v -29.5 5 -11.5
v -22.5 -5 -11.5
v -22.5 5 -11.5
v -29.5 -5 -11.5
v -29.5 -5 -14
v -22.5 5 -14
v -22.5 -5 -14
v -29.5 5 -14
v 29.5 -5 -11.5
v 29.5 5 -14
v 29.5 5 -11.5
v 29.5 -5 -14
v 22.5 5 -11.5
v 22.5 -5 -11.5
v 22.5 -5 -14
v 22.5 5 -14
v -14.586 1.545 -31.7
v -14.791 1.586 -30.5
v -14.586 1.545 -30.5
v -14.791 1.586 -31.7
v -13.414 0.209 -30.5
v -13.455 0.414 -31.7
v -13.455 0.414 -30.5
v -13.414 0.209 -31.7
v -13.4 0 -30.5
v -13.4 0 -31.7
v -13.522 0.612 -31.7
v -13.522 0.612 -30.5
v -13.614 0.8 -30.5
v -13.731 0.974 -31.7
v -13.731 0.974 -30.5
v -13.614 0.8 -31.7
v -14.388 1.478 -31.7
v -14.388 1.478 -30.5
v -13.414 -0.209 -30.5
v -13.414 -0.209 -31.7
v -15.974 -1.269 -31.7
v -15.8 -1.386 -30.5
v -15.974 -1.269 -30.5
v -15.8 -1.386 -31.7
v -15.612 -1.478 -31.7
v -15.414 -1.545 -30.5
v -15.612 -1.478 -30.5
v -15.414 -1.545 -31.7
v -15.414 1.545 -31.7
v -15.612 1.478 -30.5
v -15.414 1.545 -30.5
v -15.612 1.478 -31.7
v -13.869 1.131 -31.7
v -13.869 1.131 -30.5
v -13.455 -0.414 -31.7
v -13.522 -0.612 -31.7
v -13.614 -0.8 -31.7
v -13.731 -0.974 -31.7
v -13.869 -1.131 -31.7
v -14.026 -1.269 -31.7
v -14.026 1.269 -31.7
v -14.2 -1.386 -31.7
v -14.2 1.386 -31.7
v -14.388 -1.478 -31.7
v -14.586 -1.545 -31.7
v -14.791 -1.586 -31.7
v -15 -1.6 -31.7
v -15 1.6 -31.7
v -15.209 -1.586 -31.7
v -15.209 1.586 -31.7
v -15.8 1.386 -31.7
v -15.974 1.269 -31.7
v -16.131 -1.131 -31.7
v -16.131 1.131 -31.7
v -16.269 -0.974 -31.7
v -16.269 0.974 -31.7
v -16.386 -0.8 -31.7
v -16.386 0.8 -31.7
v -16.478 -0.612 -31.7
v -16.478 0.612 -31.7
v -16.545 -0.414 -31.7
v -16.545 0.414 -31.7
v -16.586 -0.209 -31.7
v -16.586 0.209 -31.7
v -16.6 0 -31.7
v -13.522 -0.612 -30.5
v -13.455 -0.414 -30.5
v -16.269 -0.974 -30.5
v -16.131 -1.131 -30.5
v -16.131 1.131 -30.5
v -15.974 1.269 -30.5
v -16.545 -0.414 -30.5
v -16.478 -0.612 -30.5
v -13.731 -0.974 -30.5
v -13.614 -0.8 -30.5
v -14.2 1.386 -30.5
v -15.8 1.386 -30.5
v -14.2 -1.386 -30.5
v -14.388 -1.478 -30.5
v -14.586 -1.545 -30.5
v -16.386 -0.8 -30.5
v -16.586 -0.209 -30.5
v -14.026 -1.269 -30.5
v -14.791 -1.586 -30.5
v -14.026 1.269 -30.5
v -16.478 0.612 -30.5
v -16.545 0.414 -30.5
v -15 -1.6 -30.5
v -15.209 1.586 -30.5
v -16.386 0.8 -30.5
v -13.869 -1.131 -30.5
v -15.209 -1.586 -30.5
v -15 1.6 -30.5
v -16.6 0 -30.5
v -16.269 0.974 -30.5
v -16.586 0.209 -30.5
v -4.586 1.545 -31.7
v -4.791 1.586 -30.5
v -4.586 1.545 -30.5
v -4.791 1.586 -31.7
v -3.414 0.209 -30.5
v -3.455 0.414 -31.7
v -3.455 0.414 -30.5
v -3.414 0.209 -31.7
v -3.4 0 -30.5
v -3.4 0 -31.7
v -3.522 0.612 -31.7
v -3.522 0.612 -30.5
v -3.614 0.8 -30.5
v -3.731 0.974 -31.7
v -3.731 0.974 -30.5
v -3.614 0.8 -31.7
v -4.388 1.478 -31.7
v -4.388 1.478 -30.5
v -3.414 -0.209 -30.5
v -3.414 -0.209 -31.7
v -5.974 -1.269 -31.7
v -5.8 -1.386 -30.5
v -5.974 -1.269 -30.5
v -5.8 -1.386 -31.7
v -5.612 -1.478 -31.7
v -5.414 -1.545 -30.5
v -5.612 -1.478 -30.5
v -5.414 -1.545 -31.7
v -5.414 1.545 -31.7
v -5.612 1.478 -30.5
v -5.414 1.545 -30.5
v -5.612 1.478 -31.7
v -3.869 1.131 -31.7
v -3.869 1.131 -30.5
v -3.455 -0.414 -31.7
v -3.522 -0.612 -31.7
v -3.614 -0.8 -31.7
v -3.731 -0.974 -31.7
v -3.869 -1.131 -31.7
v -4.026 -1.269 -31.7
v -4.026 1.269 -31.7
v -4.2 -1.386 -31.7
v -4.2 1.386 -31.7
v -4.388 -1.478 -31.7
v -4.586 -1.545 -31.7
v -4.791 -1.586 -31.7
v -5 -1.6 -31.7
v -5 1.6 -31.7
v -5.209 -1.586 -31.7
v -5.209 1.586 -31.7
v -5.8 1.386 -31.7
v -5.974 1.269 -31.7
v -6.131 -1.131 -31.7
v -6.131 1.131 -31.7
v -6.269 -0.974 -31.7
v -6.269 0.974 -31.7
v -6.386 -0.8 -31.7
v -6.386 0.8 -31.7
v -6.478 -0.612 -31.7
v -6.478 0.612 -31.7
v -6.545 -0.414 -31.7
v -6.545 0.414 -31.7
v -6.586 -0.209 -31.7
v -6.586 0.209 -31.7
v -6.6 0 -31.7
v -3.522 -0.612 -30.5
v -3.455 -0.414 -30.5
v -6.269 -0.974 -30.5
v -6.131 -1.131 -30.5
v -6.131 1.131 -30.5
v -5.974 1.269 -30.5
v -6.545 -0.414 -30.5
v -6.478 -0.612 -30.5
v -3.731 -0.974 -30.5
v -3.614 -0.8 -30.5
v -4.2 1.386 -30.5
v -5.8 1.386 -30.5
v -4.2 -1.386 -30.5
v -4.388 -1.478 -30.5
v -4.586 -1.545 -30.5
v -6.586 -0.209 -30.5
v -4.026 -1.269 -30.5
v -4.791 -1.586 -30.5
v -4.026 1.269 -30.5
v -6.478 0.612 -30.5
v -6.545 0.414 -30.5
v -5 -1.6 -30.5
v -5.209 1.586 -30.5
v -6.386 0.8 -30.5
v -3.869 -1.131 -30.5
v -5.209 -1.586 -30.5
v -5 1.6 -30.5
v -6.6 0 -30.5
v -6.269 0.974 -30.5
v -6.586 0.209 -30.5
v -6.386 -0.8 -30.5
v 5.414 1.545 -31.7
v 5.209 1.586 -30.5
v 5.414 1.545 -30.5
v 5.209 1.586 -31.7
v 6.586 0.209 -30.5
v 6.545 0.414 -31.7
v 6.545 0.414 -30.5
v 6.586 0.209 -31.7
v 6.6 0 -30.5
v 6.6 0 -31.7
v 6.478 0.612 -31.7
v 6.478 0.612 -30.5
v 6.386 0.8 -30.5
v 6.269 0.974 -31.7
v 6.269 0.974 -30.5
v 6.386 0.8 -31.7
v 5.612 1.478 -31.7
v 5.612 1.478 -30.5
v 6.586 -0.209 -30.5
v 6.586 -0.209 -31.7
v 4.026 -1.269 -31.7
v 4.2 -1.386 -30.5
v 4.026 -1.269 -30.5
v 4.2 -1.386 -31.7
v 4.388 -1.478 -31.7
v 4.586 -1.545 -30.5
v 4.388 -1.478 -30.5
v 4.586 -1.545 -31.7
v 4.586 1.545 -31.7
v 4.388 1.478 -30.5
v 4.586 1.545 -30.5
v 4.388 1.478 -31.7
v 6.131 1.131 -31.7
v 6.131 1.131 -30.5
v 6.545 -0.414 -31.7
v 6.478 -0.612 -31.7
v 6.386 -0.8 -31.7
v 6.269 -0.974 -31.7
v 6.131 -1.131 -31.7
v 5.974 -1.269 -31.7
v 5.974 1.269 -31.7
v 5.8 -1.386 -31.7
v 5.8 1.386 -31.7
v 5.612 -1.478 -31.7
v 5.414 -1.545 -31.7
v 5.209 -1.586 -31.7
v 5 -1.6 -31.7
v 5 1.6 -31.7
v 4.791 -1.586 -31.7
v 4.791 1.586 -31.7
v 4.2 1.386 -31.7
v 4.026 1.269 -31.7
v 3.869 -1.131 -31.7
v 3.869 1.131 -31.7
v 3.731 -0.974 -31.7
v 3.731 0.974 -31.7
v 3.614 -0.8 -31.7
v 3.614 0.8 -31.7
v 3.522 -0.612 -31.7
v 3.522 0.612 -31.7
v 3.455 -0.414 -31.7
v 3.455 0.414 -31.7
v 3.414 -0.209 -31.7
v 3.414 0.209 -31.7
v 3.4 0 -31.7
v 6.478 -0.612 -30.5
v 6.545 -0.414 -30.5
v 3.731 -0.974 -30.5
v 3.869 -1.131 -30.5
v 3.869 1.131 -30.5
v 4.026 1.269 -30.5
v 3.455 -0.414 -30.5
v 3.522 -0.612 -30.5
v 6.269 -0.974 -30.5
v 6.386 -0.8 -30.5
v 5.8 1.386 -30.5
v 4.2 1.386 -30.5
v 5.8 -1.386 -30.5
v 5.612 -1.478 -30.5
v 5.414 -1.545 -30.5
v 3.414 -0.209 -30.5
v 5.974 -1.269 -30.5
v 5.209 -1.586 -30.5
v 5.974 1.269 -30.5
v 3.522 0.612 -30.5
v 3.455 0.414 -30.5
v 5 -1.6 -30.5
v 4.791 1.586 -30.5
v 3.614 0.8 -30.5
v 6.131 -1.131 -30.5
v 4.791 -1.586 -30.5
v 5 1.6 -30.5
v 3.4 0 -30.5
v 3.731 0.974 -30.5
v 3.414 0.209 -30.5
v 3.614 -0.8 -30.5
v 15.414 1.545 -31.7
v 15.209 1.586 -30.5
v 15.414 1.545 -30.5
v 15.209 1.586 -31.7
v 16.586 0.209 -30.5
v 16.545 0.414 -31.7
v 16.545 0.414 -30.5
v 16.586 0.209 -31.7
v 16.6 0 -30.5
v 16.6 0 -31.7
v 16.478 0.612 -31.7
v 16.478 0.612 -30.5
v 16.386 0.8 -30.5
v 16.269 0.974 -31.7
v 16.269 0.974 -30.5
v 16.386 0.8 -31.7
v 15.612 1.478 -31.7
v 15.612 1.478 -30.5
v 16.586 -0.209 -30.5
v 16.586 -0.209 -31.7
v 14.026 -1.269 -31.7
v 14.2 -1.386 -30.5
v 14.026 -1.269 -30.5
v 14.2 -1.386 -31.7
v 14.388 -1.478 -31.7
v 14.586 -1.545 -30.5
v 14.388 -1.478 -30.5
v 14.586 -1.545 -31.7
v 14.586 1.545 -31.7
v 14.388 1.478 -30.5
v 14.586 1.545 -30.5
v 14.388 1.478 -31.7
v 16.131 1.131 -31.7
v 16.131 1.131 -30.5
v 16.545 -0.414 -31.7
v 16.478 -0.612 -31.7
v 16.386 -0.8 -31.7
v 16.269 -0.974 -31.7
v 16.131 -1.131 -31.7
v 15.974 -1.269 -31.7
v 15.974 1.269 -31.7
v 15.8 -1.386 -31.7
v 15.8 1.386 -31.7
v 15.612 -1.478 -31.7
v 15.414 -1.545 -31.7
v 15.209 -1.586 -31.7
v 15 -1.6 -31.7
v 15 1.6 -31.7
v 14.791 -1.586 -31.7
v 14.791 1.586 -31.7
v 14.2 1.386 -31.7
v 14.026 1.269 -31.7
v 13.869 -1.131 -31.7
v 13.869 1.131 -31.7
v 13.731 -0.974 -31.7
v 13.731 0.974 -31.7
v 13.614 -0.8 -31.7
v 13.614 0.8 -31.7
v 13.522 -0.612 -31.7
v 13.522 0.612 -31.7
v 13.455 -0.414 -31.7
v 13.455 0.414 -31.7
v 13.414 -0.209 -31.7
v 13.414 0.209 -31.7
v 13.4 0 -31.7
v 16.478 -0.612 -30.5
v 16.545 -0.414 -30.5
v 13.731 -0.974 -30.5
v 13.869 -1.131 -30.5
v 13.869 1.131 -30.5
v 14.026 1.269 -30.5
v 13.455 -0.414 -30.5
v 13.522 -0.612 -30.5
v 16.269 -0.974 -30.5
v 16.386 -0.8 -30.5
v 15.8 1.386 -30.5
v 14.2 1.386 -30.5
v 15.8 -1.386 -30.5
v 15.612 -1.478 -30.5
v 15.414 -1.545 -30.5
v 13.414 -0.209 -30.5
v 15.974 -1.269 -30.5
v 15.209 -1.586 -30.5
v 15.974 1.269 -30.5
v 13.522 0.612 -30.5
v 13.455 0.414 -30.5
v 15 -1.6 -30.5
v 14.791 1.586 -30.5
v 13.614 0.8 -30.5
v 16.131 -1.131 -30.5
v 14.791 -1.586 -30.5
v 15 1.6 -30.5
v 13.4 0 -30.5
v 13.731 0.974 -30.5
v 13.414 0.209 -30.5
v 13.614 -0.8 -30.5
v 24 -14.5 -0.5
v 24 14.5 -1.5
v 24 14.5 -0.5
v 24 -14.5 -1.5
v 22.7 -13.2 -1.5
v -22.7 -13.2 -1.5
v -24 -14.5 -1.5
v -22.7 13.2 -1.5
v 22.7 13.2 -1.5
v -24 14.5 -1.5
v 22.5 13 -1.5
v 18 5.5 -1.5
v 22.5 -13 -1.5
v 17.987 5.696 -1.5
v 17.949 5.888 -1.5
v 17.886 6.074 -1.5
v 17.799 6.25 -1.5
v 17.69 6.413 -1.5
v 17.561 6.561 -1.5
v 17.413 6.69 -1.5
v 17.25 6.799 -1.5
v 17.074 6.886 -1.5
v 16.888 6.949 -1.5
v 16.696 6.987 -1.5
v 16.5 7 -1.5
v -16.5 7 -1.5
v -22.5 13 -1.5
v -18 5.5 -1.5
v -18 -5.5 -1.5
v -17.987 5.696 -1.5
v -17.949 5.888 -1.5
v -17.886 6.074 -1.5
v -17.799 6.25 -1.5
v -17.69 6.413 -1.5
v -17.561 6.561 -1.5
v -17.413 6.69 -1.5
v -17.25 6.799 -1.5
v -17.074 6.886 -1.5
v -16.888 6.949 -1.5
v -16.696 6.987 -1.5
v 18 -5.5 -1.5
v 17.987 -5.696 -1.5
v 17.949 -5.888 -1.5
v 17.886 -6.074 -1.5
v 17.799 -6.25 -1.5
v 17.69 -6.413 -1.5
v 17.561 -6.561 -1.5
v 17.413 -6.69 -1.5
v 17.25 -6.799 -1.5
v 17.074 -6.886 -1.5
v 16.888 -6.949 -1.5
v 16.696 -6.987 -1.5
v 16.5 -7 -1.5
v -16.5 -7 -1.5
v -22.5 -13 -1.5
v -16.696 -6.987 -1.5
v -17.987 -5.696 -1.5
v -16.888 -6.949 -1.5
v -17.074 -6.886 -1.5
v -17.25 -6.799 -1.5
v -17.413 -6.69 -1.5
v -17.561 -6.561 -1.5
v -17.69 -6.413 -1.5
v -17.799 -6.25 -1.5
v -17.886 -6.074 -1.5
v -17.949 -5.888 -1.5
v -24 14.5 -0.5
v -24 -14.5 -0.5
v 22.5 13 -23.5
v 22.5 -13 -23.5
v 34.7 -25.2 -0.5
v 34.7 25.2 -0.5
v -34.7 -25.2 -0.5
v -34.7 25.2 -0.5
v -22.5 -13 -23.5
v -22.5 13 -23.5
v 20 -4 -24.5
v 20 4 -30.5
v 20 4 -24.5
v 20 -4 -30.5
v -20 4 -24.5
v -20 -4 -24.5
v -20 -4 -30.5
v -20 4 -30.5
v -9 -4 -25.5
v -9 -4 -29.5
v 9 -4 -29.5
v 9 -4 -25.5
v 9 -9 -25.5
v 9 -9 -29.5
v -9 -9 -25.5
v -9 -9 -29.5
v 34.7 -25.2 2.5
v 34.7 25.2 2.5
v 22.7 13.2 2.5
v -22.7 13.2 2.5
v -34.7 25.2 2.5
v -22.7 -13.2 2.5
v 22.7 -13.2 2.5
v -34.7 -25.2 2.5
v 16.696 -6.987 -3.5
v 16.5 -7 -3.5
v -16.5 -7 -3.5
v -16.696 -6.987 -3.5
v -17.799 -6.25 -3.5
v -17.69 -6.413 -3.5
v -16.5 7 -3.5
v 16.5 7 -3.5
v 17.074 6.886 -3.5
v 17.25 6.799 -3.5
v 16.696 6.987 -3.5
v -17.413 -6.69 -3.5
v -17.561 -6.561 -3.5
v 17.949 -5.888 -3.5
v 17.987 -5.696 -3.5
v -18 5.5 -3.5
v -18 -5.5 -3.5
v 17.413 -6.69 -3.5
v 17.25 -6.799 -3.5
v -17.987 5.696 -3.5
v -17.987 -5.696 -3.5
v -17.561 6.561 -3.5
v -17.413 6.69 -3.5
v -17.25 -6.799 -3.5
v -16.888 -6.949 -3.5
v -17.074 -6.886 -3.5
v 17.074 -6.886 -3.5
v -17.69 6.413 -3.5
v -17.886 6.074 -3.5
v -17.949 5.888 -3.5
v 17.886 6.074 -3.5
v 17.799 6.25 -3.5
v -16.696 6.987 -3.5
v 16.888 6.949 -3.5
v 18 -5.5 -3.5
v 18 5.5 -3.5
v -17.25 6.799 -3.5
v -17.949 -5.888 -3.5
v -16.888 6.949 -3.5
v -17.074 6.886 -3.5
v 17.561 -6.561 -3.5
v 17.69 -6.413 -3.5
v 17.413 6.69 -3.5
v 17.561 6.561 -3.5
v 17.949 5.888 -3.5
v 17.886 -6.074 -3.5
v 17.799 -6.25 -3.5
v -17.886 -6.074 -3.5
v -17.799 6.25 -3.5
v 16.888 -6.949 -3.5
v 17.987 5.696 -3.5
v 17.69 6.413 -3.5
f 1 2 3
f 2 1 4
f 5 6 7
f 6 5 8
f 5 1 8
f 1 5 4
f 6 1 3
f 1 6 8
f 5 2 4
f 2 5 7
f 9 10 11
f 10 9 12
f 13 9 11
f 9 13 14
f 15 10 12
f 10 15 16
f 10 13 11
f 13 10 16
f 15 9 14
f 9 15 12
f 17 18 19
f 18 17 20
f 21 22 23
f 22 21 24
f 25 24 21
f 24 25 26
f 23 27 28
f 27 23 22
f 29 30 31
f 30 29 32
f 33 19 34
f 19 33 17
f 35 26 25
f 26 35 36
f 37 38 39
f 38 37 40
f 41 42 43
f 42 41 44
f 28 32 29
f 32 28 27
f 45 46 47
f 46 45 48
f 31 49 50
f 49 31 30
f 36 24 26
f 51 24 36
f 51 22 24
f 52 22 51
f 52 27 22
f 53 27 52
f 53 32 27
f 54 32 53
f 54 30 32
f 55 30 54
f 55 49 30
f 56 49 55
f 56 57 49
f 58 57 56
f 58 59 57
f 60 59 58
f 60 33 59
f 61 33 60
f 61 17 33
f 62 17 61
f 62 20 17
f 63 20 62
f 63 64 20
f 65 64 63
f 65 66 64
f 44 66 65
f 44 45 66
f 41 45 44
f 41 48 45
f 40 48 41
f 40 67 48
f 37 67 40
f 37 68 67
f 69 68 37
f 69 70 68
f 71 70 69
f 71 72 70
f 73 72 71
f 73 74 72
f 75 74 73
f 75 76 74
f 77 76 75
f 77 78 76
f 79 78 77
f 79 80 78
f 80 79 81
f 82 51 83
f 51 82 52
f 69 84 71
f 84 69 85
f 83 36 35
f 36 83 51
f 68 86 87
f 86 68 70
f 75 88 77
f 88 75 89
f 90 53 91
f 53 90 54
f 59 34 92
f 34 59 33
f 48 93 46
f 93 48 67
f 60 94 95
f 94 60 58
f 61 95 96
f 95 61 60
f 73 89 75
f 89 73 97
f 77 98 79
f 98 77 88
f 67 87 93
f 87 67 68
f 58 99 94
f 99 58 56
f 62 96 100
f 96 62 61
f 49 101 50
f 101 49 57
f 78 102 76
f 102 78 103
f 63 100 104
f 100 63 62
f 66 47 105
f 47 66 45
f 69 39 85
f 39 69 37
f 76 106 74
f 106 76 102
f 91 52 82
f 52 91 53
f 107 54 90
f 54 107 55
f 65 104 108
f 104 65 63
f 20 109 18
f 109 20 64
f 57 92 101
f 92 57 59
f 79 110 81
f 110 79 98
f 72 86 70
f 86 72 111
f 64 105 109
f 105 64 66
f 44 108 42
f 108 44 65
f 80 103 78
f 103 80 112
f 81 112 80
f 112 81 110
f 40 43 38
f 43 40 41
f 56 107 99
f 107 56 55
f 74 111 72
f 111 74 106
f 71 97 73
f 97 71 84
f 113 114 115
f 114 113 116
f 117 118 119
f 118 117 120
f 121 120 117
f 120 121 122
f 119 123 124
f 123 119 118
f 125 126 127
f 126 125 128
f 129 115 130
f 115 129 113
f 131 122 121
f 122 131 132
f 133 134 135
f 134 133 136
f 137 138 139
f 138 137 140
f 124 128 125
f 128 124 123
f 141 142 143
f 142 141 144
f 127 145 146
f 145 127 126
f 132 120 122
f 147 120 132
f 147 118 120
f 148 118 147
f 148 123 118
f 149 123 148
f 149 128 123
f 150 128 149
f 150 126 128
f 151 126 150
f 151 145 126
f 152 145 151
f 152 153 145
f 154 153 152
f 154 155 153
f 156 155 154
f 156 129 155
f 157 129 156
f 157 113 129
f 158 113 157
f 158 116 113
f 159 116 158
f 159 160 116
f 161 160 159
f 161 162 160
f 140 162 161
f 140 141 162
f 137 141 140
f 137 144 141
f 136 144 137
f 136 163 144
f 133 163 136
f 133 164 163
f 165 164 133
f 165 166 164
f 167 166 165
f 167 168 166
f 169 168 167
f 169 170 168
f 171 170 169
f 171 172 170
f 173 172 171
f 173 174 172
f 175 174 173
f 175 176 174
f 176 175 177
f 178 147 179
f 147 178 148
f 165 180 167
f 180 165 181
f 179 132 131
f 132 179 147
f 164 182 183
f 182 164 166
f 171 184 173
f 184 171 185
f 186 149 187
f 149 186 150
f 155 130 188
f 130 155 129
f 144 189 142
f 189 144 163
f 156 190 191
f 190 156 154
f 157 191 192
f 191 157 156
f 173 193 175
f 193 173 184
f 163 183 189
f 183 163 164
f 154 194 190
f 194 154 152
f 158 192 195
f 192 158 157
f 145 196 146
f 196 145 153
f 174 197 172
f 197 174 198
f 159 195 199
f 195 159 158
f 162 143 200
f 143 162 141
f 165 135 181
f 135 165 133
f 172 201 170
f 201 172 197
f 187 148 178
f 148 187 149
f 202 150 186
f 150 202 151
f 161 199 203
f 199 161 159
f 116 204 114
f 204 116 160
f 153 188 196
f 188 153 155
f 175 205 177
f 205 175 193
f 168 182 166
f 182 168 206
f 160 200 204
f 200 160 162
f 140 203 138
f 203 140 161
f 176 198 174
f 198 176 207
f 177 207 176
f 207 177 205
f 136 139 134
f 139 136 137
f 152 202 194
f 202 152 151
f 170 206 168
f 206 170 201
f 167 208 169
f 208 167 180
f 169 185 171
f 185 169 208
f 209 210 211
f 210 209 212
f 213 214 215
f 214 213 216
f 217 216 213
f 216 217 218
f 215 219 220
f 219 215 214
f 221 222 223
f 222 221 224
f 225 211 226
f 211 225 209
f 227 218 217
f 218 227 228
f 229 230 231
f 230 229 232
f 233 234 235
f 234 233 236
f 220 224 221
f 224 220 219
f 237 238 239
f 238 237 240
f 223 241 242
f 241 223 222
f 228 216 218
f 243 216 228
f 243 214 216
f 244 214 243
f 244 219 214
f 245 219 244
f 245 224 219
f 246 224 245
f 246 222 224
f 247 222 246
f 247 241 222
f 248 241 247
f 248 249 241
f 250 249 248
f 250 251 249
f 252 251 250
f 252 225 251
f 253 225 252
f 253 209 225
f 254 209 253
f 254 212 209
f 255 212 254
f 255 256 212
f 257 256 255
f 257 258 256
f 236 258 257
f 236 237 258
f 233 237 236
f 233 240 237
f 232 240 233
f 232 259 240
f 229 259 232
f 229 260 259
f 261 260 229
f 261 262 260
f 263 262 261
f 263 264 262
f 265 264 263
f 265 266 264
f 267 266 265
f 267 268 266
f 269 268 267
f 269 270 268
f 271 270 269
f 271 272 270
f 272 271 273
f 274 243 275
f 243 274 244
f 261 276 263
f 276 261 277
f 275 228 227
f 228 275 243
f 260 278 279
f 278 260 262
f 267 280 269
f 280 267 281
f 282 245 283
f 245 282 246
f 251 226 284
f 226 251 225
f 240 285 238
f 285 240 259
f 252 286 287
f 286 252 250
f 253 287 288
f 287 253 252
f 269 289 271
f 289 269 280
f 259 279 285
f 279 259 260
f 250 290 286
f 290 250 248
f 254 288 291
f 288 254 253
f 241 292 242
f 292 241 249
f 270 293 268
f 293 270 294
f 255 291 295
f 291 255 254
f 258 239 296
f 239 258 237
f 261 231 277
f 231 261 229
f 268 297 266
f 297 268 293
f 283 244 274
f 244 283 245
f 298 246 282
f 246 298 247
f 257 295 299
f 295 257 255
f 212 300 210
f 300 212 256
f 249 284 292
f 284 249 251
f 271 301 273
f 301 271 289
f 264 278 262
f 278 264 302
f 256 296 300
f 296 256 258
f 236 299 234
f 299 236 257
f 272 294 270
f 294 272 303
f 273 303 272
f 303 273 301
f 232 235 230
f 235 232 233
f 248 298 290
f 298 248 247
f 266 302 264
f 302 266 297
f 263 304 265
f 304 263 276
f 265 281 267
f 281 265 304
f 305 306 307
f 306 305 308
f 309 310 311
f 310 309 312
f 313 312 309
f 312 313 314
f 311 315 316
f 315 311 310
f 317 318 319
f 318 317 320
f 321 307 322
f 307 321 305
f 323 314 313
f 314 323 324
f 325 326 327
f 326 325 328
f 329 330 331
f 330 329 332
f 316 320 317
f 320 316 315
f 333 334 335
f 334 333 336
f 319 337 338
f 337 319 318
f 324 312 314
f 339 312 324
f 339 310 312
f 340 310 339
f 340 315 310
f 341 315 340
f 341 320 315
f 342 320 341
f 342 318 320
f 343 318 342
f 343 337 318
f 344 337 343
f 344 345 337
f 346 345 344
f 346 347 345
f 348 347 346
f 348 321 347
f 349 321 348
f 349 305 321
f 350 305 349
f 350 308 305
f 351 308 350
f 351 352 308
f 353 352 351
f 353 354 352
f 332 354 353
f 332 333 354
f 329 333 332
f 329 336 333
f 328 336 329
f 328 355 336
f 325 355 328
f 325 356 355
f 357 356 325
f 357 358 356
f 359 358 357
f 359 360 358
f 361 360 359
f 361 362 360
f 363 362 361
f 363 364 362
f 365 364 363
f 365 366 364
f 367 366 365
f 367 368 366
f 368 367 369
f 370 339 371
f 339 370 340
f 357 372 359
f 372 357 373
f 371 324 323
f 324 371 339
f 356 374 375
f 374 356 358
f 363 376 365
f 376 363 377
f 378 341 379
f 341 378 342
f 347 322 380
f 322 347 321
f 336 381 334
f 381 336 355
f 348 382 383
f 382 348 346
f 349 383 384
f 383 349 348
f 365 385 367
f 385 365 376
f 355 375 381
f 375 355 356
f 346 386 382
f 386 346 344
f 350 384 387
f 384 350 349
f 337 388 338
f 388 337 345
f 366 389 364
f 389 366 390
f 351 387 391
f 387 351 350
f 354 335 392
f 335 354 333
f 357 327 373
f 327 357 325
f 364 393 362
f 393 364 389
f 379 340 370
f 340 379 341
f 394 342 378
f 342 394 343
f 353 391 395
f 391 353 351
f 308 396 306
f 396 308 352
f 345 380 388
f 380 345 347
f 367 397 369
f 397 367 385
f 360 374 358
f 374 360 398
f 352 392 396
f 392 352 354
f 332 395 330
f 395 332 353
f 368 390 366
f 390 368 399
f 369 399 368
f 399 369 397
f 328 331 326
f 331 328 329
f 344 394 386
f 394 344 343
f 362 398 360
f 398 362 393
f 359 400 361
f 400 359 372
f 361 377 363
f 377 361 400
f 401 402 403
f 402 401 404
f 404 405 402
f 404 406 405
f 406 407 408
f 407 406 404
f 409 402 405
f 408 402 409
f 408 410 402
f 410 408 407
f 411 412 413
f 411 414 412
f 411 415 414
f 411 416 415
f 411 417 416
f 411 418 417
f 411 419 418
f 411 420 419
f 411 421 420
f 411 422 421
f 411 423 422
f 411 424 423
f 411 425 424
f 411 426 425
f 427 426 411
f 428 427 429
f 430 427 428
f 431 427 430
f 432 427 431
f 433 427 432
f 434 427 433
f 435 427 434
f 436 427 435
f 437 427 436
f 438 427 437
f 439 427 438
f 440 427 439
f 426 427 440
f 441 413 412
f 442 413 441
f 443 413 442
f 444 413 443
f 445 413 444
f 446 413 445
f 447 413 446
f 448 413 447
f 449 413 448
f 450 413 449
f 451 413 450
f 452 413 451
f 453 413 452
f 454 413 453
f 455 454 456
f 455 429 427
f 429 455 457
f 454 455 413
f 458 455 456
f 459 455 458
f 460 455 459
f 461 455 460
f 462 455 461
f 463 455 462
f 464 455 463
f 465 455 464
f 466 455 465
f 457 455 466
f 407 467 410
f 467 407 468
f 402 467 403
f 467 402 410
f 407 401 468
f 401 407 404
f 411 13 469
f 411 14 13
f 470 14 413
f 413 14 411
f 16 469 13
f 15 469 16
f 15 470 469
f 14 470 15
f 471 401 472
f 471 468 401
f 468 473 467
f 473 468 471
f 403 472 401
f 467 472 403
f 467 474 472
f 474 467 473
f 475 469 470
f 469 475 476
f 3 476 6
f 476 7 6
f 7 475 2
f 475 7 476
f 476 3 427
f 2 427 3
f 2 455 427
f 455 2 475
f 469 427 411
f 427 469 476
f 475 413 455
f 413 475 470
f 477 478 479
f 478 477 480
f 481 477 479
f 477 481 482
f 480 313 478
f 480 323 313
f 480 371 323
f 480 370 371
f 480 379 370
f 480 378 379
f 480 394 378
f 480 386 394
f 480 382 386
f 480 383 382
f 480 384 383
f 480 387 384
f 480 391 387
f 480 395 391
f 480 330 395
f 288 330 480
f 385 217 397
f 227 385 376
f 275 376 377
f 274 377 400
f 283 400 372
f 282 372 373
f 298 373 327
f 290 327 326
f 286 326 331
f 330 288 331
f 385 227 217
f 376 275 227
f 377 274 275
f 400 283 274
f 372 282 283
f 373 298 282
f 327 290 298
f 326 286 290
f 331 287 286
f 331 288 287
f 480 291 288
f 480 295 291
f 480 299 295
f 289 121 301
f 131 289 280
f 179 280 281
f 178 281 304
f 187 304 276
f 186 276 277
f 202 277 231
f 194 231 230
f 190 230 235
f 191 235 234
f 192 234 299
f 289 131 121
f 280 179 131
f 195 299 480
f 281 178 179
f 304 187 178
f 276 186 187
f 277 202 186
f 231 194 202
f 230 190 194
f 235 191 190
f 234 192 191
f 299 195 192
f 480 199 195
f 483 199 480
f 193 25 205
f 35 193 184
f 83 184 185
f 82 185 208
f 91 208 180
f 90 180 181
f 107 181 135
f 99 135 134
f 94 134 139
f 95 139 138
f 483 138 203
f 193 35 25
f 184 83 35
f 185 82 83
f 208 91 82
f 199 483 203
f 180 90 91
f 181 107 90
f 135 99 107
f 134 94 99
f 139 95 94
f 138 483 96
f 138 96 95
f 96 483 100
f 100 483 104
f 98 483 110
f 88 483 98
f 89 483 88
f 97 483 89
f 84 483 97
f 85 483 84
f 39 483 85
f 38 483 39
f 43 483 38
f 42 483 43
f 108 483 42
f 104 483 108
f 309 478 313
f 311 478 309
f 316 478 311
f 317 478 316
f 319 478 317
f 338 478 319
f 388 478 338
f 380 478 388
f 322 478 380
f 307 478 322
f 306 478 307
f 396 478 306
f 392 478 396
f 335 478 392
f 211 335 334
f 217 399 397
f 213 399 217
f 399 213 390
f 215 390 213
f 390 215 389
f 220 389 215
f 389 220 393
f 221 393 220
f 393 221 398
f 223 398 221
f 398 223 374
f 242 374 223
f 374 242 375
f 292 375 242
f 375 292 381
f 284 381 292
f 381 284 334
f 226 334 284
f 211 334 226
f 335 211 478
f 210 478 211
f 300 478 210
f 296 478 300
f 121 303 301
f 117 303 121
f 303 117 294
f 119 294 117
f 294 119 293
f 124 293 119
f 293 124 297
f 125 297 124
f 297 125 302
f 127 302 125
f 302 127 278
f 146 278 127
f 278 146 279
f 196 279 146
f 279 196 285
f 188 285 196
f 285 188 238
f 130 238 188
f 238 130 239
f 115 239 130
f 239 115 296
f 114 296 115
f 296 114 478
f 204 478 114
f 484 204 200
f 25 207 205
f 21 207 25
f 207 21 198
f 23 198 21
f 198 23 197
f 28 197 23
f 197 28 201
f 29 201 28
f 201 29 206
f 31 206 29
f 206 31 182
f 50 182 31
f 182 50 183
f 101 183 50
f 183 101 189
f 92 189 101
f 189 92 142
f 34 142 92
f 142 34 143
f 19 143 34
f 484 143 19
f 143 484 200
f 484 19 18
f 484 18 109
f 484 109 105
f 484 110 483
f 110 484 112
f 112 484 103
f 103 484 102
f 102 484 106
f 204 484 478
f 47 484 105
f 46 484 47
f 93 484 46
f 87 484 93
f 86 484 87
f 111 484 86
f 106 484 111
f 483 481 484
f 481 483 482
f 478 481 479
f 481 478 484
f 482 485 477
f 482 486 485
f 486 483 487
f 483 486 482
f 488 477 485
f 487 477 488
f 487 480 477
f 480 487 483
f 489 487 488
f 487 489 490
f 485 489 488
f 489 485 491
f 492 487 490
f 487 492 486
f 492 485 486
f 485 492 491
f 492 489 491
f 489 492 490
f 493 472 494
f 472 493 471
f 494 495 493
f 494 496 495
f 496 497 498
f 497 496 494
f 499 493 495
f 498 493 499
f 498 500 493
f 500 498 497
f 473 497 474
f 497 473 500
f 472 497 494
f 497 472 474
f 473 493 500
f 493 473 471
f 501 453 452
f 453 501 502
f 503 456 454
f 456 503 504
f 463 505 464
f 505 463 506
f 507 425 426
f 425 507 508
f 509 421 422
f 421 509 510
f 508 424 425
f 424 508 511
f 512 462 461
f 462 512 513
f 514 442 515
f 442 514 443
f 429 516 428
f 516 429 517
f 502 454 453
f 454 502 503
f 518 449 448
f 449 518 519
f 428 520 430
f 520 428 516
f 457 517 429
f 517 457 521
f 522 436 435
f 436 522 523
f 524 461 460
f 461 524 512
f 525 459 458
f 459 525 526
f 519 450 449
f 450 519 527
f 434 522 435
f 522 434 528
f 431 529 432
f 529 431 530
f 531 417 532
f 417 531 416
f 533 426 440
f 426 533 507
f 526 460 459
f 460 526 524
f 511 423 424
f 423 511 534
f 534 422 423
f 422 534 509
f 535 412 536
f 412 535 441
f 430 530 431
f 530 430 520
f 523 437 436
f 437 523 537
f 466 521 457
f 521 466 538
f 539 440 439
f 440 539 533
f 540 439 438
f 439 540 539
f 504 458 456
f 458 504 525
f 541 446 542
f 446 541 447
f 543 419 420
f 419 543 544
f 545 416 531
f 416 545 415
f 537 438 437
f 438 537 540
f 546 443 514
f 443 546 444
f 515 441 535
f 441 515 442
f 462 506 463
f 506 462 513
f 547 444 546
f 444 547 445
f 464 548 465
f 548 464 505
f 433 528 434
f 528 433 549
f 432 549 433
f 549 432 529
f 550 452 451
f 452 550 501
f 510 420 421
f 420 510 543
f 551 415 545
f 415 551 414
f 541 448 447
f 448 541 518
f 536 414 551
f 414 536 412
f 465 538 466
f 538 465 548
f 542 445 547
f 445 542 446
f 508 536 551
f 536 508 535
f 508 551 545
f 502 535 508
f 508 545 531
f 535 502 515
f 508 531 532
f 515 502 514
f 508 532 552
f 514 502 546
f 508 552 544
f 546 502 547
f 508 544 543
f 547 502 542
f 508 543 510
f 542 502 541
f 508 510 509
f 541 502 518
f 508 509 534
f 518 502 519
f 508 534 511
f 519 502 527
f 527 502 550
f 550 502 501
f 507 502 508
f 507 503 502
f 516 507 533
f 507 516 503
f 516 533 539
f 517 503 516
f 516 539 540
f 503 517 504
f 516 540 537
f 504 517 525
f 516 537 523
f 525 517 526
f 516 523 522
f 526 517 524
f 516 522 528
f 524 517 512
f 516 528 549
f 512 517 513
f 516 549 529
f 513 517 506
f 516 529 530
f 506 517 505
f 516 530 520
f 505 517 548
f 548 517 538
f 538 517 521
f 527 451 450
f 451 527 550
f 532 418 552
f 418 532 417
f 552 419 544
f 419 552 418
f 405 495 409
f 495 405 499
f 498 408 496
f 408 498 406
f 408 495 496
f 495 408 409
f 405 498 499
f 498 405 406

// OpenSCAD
// DSN-DC 100V 10A Panel Meter (approximate) - single connected solid
// No text/labels. All parts connected via calculated offsets/overlaps.

$fn = 48;

// Parameters
voltage_range_max_v = 100; //[50:200:1]
current_range_max_a = 10;  //[5:20:1]

cutout_tolerance_mm = 0.2; //[0.0:1.0:0.05]
overlap_mm = 1;            //[0.5:2:0.1]

// Overall envelope (approx DSN-DC style)
overall_x = 48; //[24:96:1]
overall_y = 29; //[15:58:1]
overall_z = 26; //[13:52:1]

// Front bezel
bezel_x = 48; //[24:96:1]
bezel_y = 29; //[15:58:1]
bezel_z = 3;  //[1.5:6:0.5]

// Rear body (insert)
body_x = 45; //[22.5:90:1]
body_y = 26; //[13:52:1]
body_z = 23; //[11.5:46:1]

// Display window
display_ap_x = 36; //[18:72:1]
display_ap_y = 14; //[7:28:1]
display_ap_corner_r = 1.5; //[0:4:0.25]
display_ap_through_z = 6;  //[3:12:0.5]

// Front "lens" recess and inner bezel lip (adds recognizable front-face detail)
lens_recess_depth = 1.2; //[0.5:2.5:0.1]
lens_lip = 1.2;          //[0.5:3:0.1]

// Button
button_enabled = 1; //[0:1:1]
button_radius = 2.2; //[1:4.5:0.1]
button_height = 1.2; //[0.6:2.4:0.1]
button_x_offset = 18; //[0:30:1]
button_y_offset = -9; //[-20:20:1]

// Mounting side tabs (ears)
tab_enabled = 1; //[0:1:1]
tab_x = 8;  //[4:16:0.5]
tab_y = 10; //[5:20:0.5]
tab_z = 2.5; //[1:5:0.25]
tab_z_offset = 10; //[5:20:1]

// Rear terminal block + pads (adds recognizable back-side connectivity)
term_block_x = 40; //[20:60:1]
term_block_y = 8;  //[5:16:0.5]
term_block_z = 6;  //[3:12:0.5]
term_block_setback = 2; //[0:6:0.5]  // from rear face of body

pad_count = 4;          // typical DSN-DC has multiple connections
pad_pitch = 10;         //[6:14:0.5]
pad_d = 3.2;            //[2:5:0.1]
pad_h = 2.2;            //[1:4:0.1]
pad_y_offset = 0;       // centered on terminal block

// Shunt-like rear protrusion (stylized)
shunt_x = 18; //[10:30:1]
shunt_y = 6;  //[3:12:0.5]
shunt_z = 4;  //[2:10:0.5]
shunt_offset_y = -(term_block_y/2 + shunt_y/2 - overlap_mm);

// Panel cutout (kept but fused to model so output is one connected solid)
panel_thickness = 3; //[1:6:0.5]
panel_margin = 12;   //[6:24:1]
rear_clearance_extra = 6; //[3:12:0.5]

// Helpers
module rounded_rect_prism(x, y, z, r, center=true) {
  r2 = min(r, min(x,y)/2);
  translate(center ? [0,0,0] : [x/2,y/2,z/2])
    linear_extrude(height=z, center=true)
      offset(r=r2)
        square([x-2*r2, y-2*r2], center=true);
}

module rounded_window_cut(x, y, z, r) {
  // A rounded-rectangle "cutter" centered at origin
  linear_extrude(height=z, center=true)
    offset(r=r)
      square([x-2*r, y-2*r], center=true);
}

module panel_meter_solid() {
  // Coordinate convention:
  // Front face of bezel at z = +bezel_z/2
  // Bezel centered at z=0, body extends to negative z.
  union() {
    // --- Main housing (bezel + body) as one connected solid ---
    // Bezel block
    translate([0,0,0])
      cube([bezel_x, bezel_y, bezel_z], center=true);

    // Rear body connected to bezel with overlap
    translate([0,0, -(bezel_z/2 + body_z/2 - overlap_mm)])
      cube([body_x, body_y, body_z], center=true);

    // Side mounting tabs (ears) connected to body
    if (tab_enabled) {
      tab_z_center = -(bezel_z/2 + tab_z_offset + tab_z/2);
      translate([-(body_x/2 + tab_x/2 - overlap_mm), 0, tab_z_center])
        cube([tab_x, tab_y, tab_z], center=true);
      translate([(body_x/2 + tab_x/2 - overlap_mm), 0, tab_z_center])
        cube([tab_x, tab_y, tab_z], center=true);
    }

    // --- Rear terminal block connected to rear of body ---
    // Rear face of body is at z = -(bezel_z/2 + body_z - overlap_mm)
    body_center_z = -(bezel_z/2 + body_z/2 - overlap_mm);
    body_rear_face_z = body_center_z - body_z/2;

    term_center_z = body_rear_face_z - term_block_z/2 + overlap_mm - term_block_setback;
    translate([0, 0, term_center_z])
      cube([term_block_x, term_block_y, term_block_z], center=true);

    // Rear pads/posts on terminal block (protrude further back)
    // Terminal block rear face:
    term_rear_face_z = term_center_z - term_block_z/2;
    pad_center_z = term_rear_face_z - pad_h/2 + overlap_mm;

    for (i = [0:pad_count-1]) {
      x_i = (i - (pad_count-1)/2) * pad_pitch;
      translate([x_i, pad_y_offset, pad_center_z])
        cylinder(d=pad_d, h=pad_h, center=true);
    }

    // Shunt-like protrusion connected under terminal block
    shunt_center_z = term_center_z; // same z as terminal block for solid connection
    translate([0, shunt_offset_y, shunt_center_z])
      cube([shunt_x, shunt_y, shunt_z], center=true);

    // Front button connected to bezel front
    if (button_enabled) {
      // Bezel front face at +bezel_z/2
      btn_center_z = (bezel_z/2) + button_height/2 - overlap_mm;
      translate([button_x_offset, button_y_offset, btn_center_z])
        cylinder(r=button_radius, h=button_height, center=true);
    }

    // Panel "sheet" fused to bezel (so output remains one connected solid)
    // Place panel behind bezel front, intersecting bezel slightly.
    panel_center_z = (bezel_z/2) - panel_thickness/2 + overlap_mm;
    translate([0,0,panel_center_z])
      cube([body_x + 2*(panel_margin + cutout_tolerance_mm),
            body_y + 2*(panel_margin + cutout_tolerance_mm),
            panel_thickness], center=true);
  }
}

module panel_meter() {
  // Carve front-face details (display window + lens recess) while keeping one solid.
  difference() {
    panel_meter_solid();

    // Display aperture through bezel (and slightly into body)
    // Centered on bezel; cut depth spans bezel and a bit behind.
    cut_z = bezel_z + 2*overlap_mm + 2; // ensure through bezel
    translate([0, 0, 0])
      rounded_window_cut(display_ap_x, display_ap_y, cut_z, display_ap_corner_r);

    // Lens recess: a shallow pocket around the display opening (bezel detail)
    // Make a larger rounded rectangle pocket, not through.
    pocket_x = display_ap_x + 2*lens_lip;
    pocket_y = display_ap_y + 2*lens_lip;
    pocket_z = lens_recess_depth + 2*overlap_mm;
    // Position pocket so it starts at front face and goes inward
    pocket_center_z = (bezel_z/2) - lens_recess_depth/2 + overlap_mm;
    translate([0, 0, pocket_center_z])
      rounded_window_cut(pocket_x, pocket_y, pocket_z, display_ap_corner_r + 0.6);

    // Panel cutout hole (remove from panel sheet only; does not disconnect model)
    // Cutout aligned with body insert size.
    panel_center_z = (bezel_z/2) - panel_thickness/2 + overlap_mm;
    translate([0,0,panel_center_z])
      cube([body_x + 2*cutout_tolerance_mm,
            body_y + 2*cutout_tolerance_mm,
            panel_thickness + 2*overlap_mm], center=true);
  }
}

panel_meter();
